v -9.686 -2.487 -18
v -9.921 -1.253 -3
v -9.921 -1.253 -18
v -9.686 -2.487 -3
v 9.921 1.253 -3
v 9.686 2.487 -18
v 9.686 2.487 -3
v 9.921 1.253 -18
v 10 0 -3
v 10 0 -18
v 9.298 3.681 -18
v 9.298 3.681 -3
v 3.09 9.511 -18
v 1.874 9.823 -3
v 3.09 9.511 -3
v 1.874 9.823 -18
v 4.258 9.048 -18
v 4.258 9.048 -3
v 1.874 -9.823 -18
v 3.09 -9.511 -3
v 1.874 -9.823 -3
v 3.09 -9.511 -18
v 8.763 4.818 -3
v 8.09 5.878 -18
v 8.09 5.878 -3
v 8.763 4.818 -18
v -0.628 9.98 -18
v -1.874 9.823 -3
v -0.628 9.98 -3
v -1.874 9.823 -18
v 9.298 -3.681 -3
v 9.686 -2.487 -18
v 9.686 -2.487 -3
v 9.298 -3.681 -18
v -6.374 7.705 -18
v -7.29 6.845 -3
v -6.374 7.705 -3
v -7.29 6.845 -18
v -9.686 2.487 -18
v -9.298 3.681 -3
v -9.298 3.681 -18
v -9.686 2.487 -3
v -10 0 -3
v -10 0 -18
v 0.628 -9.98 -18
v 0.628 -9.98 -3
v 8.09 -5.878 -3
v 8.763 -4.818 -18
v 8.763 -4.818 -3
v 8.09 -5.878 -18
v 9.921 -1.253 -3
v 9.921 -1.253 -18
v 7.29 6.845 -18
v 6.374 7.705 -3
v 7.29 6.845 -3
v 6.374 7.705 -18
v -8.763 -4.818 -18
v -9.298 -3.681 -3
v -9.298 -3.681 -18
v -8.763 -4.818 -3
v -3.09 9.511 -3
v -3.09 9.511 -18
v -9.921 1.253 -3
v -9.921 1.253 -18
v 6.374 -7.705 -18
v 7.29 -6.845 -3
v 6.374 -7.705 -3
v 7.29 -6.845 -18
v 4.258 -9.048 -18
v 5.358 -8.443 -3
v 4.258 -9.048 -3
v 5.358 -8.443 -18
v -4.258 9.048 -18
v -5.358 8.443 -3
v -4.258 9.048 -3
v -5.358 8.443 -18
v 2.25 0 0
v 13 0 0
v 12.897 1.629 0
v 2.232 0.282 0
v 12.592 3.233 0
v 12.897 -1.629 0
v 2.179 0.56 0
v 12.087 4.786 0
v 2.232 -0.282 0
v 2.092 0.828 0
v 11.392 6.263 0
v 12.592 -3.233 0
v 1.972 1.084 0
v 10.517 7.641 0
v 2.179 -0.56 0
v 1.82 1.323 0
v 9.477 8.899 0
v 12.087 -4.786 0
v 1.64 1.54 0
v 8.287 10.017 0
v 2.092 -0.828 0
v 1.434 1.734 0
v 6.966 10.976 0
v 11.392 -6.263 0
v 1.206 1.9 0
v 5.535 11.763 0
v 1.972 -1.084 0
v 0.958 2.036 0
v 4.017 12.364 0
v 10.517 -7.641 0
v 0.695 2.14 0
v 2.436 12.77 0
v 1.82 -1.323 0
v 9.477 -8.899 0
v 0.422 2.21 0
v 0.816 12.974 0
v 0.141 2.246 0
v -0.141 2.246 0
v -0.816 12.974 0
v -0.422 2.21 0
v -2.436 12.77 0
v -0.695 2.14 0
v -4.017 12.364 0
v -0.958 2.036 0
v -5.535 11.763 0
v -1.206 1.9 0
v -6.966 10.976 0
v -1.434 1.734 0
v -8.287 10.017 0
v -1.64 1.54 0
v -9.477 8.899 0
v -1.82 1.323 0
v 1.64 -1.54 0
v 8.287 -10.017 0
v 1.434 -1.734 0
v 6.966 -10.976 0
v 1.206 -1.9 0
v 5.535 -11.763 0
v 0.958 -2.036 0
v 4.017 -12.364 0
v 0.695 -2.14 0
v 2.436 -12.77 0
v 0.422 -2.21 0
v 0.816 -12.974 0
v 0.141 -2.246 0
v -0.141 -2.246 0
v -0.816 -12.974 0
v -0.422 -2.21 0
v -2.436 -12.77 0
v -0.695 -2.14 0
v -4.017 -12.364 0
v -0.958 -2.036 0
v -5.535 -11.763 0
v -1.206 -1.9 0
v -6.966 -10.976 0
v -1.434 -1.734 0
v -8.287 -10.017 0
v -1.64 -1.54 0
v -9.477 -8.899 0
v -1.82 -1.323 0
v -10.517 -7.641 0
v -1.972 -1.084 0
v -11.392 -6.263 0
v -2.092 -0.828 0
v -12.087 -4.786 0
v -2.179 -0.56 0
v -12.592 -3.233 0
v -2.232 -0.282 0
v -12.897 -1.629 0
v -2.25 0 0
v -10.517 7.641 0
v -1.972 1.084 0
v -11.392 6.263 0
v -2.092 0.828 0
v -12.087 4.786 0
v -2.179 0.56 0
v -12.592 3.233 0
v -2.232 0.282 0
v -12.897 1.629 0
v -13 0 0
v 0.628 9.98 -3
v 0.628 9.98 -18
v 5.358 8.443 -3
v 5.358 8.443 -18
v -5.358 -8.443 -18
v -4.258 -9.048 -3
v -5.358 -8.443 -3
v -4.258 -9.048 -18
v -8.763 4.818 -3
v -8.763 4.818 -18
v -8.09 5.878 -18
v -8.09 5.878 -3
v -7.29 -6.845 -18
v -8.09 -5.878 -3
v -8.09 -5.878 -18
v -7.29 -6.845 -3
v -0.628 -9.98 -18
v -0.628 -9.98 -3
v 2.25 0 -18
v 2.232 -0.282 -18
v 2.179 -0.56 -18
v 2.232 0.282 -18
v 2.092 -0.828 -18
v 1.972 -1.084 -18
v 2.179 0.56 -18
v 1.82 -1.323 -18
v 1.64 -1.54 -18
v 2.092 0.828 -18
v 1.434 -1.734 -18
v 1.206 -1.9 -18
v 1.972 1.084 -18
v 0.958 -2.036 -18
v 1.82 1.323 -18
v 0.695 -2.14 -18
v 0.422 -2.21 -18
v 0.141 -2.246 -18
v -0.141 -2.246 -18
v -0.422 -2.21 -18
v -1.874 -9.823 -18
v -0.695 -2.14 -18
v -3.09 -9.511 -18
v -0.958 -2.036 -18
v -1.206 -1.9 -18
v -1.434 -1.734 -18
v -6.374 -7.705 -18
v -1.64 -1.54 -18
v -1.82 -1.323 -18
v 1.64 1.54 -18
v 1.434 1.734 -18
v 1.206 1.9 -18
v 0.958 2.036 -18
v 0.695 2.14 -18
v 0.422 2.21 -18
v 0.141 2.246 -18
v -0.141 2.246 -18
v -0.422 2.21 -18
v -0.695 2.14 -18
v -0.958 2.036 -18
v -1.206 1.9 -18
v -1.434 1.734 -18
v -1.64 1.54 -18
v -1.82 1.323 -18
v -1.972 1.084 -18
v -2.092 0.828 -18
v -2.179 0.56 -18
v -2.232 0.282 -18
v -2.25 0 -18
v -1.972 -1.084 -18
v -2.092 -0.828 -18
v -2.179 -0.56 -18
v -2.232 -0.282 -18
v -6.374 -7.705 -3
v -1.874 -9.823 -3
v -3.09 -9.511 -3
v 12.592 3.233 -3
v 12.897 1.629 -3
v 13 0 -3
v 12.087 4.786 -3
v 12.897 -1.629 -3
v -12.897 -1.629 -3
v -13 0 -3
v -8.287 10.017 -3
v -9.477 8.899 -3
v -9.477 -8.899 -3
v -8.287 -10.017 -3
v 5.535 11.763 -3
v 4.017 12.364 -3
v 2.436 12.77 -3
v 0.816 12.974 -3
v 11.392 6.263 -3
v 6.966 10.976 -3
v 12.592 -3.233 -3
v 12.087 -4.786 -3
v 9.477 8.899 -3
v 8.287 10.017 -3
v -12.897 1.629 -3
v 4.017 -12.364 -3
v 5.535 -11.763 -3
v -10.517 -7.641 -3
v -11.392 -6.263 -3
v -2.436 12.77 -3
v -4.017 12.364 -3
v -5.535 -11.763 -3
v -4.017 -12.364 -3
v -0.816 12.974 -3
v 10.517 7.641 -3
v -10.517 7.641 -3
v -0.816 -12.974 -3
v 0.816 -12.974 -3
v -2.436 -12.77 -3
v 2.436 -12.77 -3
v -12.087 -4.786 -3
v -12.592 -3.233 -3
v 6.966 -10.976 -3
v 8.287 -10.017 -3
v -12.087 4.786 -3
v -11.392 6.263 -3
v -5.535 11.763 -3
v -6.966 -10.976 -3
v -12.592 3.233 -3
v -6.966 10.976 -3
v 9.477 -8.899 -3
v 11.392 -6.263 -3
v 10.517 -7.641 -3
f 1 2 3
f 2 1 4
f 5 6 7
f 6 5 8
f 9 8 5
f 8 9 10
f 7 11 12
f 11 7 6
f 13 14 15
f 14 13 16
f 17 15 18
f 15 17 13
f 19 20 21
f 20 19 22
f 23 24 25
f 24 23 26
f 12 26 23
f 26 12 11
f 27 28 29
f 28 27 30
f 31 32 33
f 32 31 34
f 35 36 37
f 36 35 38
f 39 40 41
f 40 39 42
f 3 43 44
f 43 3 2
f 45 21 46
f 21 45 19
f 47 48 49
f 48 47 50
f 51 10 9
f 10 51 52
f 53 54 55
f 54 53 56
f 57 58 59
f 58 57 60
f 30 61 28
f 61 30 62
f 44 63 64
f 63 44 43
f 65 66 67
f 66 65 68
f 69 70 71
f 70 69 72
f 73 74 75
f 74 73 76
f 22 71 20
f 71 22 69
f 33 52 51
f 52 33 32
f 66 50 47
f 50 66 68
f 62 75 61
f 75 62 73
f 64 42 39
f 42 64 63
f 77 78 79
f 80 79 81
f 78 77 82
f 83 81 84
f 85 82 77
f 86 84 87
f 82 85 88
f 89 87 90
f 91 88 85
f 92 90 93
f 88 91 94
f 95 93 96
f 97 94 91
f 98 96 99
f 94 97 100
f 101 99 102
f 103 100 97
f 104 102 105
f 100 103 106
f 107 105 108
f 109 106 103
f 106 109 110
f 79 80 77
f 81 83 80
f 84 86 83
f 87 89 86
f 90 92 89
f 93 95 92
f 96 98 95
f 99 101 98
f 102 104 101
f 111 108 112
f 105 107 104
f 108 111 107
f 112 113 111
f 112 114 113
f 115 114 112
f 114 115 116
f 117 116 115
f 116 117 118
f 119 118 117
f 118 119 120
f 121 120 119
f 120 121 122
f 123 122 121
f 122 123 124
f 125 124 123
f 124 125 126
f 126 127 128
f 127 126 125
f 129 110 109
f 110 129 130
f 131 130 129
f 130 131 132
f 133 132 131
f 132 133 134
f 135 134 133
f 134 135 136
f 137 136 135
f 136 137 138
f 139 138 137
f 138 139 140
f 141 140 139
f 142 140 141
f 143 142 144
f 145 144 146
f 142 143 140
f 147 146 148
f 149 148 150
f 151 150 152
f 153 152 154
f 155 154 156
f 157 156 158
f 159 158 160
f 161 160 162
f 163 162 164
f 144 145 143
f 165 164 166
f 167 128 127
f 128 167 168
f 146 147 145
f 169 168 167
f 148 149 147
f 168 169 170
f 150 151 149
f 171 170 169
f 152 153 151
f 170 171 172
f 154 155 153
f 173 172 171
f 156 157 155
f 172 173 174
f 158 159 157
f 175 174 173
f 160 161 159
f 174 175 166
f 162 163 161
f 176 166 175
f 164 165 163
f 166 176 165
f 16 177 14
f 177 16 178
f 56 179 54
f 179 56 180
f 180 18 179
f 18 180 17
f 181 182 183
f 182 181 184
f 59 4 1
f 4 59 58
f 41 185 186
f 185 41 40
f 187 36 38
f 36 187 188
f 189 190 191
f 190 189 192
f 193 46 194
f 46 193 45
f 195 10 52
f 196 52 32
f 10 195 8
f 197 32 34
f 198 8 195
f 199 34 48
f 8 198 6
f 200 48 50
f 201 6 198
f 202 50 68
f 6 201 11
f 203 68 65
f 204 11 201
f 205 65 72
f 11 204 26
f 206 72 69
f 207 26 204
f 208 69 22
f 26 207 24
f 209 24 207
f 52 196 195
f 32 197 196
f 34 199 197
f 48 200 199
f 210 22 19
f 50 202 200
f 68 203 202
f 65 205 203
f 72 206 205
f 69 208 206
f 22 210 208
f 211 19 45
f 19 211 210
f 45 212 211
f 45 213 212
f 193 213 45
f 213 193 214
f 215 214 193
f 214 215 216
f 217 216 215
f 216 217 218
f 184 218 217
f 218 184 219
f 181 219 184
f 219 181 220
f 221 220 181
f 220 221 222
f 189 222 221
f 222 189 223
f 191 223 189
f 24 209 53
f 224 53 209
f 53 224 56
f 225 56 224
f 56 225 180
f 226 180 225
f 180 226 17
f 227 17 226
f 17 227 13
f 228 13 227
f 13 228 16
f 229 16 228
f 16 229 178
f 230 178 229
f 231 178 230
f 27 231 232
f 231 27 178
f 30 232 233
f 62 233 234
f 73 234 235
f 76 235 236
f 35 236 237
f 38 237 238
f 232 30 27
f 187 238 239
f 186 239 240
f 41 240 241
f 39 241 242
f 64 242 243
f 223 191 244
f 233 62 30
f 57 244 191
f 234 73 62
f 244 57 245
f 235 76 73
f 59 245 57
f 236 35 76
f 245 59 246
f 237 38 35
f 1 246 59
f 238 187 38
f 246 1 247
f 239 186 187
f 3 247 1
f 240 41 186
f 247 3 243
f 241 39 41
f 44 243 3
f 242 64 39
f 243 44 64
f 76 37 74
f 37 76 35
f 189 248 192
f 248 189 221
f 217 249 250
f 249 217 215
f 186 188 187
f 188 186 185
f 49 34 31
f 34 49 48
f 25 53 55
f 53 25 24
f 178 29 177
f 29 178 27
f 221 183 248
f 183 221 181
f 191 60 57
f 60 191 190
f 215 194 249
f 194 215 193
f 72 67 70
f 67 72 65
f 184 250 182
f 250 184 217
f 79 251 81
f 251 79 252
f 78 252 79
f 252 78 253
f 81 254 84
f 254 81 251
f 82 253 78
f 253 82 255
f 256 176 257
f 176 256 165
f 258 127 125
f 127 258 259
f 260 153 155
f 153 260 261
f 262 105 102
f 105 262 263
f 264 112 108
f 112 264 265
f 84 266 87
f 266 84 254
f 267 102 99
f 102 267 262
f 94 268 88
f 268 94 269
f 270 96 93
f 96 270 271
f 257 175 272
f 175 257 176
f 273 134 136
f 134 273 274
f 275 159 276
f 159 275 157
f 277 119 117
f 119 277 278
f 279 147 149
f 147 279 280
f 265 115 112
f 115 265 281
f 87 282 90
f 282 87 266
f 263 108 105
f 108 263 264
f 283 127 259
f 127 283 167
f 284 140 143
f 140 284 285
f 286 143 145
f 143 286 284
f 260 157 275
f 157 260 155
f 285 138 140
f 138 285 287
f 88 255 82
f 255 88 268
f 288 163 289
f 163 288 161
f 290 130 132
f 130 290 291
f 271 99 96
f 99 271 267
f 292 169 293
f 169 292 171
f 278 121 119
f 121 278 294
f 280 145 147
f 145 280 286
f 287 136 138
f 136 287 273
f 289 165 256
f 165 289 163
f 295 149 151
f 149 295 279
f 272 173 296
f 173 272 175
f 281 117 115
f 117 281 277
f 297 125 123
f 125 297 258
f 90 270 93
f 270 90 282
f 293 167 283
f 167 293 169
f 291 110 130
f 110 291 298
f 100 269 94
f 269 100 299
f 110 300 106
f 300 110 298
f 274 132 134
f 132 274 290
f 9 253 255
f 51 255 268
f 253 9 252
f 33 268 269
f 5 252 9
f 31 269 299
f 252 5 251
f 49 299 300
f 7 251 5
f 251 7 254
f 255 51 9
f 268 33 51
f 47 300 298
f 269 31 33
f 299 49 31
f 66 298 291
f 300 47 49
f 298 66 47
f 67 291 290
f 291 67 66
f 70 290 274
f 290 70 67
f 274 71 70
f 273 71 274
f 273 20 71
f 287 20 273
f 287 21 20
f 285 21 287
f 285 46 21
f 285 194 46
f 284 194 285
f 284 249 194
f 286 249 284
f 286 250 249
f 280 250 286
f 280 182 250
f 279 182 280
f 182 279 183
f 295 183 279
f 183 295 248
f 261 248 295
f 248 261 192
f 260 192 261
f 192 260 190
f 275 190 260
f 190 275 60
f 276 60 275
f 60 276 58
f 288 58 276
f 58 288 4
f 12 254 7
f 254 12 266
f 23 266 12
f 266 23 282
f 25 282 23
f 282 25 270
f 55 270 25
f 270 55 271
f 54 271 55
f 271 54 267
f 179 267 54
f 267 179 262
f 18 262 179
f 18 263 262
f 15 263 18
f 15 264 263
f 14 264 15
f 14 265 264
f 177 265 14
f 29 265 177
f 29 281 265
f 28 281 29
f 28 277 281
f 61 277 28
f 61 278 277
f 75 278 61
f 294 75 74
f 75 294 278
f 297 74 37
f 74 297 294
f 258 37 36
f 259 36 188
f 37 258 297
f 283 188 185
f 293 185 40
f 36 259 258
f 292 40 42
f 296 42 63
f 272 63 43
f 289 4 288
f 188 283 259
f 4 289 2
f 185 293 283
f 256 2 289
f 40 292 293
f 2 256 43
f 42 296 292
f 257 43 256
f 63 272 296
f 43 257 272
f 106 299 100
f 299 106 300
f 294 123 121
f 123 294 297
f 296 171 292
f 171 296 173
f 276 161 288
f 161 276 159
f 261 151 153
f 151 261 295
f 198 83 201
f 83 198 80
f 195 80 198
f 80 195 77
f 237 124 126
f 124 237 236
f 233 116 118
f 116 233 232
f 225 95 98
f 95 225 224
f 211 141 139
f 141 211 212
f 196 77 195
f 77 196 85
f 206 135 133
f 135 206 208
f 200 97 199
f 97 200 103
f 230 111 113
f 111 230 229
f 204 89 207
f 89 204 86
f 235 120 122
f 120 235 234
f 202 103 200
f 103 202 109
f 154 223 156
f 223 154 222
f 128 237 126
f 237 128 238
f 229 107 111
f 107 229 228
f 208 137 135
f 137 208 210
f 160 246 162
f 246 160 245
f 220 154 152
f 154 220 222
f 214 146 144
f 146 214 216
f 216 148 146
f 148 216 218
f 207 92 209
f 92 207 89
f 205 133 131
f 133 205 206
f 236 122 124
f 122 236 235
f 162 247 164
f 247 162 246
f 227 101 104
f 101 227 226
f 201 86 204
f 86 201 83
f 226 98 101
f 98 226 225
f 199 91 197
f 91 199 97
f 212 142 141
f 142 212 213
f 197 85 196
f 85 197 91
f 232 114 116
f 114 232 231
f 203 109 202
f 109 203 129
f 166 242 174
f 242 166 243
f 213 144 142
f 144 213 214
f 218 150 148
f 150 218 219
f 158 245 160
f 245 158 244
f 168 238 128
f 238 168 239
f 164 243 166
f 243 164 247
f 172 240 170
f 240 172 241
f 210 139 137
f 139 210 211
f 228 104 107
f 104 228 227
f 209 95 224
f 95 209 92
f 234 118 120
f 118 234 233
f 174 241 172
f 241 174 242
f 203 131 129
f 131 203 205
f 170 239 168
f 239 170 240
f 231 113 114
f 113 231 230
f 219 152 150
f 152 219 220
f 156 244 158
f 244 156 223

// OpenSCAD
$fn = 50;


difference() {
	union() {
		translate(v = [0, 0, -18.0000000000]) {
			cylinder(h = 18, r = 10.0000000000);
		}
		translate(v = [0, 0, -3.0000000000]) {
			cylinder(h = 3, r = 13.0000000000);
		}
	}
	union() {
		#translate(v = [0, 0, -18]) {
			cylinder(h = 18, r = 2.2500000000);
		}
	}
}
